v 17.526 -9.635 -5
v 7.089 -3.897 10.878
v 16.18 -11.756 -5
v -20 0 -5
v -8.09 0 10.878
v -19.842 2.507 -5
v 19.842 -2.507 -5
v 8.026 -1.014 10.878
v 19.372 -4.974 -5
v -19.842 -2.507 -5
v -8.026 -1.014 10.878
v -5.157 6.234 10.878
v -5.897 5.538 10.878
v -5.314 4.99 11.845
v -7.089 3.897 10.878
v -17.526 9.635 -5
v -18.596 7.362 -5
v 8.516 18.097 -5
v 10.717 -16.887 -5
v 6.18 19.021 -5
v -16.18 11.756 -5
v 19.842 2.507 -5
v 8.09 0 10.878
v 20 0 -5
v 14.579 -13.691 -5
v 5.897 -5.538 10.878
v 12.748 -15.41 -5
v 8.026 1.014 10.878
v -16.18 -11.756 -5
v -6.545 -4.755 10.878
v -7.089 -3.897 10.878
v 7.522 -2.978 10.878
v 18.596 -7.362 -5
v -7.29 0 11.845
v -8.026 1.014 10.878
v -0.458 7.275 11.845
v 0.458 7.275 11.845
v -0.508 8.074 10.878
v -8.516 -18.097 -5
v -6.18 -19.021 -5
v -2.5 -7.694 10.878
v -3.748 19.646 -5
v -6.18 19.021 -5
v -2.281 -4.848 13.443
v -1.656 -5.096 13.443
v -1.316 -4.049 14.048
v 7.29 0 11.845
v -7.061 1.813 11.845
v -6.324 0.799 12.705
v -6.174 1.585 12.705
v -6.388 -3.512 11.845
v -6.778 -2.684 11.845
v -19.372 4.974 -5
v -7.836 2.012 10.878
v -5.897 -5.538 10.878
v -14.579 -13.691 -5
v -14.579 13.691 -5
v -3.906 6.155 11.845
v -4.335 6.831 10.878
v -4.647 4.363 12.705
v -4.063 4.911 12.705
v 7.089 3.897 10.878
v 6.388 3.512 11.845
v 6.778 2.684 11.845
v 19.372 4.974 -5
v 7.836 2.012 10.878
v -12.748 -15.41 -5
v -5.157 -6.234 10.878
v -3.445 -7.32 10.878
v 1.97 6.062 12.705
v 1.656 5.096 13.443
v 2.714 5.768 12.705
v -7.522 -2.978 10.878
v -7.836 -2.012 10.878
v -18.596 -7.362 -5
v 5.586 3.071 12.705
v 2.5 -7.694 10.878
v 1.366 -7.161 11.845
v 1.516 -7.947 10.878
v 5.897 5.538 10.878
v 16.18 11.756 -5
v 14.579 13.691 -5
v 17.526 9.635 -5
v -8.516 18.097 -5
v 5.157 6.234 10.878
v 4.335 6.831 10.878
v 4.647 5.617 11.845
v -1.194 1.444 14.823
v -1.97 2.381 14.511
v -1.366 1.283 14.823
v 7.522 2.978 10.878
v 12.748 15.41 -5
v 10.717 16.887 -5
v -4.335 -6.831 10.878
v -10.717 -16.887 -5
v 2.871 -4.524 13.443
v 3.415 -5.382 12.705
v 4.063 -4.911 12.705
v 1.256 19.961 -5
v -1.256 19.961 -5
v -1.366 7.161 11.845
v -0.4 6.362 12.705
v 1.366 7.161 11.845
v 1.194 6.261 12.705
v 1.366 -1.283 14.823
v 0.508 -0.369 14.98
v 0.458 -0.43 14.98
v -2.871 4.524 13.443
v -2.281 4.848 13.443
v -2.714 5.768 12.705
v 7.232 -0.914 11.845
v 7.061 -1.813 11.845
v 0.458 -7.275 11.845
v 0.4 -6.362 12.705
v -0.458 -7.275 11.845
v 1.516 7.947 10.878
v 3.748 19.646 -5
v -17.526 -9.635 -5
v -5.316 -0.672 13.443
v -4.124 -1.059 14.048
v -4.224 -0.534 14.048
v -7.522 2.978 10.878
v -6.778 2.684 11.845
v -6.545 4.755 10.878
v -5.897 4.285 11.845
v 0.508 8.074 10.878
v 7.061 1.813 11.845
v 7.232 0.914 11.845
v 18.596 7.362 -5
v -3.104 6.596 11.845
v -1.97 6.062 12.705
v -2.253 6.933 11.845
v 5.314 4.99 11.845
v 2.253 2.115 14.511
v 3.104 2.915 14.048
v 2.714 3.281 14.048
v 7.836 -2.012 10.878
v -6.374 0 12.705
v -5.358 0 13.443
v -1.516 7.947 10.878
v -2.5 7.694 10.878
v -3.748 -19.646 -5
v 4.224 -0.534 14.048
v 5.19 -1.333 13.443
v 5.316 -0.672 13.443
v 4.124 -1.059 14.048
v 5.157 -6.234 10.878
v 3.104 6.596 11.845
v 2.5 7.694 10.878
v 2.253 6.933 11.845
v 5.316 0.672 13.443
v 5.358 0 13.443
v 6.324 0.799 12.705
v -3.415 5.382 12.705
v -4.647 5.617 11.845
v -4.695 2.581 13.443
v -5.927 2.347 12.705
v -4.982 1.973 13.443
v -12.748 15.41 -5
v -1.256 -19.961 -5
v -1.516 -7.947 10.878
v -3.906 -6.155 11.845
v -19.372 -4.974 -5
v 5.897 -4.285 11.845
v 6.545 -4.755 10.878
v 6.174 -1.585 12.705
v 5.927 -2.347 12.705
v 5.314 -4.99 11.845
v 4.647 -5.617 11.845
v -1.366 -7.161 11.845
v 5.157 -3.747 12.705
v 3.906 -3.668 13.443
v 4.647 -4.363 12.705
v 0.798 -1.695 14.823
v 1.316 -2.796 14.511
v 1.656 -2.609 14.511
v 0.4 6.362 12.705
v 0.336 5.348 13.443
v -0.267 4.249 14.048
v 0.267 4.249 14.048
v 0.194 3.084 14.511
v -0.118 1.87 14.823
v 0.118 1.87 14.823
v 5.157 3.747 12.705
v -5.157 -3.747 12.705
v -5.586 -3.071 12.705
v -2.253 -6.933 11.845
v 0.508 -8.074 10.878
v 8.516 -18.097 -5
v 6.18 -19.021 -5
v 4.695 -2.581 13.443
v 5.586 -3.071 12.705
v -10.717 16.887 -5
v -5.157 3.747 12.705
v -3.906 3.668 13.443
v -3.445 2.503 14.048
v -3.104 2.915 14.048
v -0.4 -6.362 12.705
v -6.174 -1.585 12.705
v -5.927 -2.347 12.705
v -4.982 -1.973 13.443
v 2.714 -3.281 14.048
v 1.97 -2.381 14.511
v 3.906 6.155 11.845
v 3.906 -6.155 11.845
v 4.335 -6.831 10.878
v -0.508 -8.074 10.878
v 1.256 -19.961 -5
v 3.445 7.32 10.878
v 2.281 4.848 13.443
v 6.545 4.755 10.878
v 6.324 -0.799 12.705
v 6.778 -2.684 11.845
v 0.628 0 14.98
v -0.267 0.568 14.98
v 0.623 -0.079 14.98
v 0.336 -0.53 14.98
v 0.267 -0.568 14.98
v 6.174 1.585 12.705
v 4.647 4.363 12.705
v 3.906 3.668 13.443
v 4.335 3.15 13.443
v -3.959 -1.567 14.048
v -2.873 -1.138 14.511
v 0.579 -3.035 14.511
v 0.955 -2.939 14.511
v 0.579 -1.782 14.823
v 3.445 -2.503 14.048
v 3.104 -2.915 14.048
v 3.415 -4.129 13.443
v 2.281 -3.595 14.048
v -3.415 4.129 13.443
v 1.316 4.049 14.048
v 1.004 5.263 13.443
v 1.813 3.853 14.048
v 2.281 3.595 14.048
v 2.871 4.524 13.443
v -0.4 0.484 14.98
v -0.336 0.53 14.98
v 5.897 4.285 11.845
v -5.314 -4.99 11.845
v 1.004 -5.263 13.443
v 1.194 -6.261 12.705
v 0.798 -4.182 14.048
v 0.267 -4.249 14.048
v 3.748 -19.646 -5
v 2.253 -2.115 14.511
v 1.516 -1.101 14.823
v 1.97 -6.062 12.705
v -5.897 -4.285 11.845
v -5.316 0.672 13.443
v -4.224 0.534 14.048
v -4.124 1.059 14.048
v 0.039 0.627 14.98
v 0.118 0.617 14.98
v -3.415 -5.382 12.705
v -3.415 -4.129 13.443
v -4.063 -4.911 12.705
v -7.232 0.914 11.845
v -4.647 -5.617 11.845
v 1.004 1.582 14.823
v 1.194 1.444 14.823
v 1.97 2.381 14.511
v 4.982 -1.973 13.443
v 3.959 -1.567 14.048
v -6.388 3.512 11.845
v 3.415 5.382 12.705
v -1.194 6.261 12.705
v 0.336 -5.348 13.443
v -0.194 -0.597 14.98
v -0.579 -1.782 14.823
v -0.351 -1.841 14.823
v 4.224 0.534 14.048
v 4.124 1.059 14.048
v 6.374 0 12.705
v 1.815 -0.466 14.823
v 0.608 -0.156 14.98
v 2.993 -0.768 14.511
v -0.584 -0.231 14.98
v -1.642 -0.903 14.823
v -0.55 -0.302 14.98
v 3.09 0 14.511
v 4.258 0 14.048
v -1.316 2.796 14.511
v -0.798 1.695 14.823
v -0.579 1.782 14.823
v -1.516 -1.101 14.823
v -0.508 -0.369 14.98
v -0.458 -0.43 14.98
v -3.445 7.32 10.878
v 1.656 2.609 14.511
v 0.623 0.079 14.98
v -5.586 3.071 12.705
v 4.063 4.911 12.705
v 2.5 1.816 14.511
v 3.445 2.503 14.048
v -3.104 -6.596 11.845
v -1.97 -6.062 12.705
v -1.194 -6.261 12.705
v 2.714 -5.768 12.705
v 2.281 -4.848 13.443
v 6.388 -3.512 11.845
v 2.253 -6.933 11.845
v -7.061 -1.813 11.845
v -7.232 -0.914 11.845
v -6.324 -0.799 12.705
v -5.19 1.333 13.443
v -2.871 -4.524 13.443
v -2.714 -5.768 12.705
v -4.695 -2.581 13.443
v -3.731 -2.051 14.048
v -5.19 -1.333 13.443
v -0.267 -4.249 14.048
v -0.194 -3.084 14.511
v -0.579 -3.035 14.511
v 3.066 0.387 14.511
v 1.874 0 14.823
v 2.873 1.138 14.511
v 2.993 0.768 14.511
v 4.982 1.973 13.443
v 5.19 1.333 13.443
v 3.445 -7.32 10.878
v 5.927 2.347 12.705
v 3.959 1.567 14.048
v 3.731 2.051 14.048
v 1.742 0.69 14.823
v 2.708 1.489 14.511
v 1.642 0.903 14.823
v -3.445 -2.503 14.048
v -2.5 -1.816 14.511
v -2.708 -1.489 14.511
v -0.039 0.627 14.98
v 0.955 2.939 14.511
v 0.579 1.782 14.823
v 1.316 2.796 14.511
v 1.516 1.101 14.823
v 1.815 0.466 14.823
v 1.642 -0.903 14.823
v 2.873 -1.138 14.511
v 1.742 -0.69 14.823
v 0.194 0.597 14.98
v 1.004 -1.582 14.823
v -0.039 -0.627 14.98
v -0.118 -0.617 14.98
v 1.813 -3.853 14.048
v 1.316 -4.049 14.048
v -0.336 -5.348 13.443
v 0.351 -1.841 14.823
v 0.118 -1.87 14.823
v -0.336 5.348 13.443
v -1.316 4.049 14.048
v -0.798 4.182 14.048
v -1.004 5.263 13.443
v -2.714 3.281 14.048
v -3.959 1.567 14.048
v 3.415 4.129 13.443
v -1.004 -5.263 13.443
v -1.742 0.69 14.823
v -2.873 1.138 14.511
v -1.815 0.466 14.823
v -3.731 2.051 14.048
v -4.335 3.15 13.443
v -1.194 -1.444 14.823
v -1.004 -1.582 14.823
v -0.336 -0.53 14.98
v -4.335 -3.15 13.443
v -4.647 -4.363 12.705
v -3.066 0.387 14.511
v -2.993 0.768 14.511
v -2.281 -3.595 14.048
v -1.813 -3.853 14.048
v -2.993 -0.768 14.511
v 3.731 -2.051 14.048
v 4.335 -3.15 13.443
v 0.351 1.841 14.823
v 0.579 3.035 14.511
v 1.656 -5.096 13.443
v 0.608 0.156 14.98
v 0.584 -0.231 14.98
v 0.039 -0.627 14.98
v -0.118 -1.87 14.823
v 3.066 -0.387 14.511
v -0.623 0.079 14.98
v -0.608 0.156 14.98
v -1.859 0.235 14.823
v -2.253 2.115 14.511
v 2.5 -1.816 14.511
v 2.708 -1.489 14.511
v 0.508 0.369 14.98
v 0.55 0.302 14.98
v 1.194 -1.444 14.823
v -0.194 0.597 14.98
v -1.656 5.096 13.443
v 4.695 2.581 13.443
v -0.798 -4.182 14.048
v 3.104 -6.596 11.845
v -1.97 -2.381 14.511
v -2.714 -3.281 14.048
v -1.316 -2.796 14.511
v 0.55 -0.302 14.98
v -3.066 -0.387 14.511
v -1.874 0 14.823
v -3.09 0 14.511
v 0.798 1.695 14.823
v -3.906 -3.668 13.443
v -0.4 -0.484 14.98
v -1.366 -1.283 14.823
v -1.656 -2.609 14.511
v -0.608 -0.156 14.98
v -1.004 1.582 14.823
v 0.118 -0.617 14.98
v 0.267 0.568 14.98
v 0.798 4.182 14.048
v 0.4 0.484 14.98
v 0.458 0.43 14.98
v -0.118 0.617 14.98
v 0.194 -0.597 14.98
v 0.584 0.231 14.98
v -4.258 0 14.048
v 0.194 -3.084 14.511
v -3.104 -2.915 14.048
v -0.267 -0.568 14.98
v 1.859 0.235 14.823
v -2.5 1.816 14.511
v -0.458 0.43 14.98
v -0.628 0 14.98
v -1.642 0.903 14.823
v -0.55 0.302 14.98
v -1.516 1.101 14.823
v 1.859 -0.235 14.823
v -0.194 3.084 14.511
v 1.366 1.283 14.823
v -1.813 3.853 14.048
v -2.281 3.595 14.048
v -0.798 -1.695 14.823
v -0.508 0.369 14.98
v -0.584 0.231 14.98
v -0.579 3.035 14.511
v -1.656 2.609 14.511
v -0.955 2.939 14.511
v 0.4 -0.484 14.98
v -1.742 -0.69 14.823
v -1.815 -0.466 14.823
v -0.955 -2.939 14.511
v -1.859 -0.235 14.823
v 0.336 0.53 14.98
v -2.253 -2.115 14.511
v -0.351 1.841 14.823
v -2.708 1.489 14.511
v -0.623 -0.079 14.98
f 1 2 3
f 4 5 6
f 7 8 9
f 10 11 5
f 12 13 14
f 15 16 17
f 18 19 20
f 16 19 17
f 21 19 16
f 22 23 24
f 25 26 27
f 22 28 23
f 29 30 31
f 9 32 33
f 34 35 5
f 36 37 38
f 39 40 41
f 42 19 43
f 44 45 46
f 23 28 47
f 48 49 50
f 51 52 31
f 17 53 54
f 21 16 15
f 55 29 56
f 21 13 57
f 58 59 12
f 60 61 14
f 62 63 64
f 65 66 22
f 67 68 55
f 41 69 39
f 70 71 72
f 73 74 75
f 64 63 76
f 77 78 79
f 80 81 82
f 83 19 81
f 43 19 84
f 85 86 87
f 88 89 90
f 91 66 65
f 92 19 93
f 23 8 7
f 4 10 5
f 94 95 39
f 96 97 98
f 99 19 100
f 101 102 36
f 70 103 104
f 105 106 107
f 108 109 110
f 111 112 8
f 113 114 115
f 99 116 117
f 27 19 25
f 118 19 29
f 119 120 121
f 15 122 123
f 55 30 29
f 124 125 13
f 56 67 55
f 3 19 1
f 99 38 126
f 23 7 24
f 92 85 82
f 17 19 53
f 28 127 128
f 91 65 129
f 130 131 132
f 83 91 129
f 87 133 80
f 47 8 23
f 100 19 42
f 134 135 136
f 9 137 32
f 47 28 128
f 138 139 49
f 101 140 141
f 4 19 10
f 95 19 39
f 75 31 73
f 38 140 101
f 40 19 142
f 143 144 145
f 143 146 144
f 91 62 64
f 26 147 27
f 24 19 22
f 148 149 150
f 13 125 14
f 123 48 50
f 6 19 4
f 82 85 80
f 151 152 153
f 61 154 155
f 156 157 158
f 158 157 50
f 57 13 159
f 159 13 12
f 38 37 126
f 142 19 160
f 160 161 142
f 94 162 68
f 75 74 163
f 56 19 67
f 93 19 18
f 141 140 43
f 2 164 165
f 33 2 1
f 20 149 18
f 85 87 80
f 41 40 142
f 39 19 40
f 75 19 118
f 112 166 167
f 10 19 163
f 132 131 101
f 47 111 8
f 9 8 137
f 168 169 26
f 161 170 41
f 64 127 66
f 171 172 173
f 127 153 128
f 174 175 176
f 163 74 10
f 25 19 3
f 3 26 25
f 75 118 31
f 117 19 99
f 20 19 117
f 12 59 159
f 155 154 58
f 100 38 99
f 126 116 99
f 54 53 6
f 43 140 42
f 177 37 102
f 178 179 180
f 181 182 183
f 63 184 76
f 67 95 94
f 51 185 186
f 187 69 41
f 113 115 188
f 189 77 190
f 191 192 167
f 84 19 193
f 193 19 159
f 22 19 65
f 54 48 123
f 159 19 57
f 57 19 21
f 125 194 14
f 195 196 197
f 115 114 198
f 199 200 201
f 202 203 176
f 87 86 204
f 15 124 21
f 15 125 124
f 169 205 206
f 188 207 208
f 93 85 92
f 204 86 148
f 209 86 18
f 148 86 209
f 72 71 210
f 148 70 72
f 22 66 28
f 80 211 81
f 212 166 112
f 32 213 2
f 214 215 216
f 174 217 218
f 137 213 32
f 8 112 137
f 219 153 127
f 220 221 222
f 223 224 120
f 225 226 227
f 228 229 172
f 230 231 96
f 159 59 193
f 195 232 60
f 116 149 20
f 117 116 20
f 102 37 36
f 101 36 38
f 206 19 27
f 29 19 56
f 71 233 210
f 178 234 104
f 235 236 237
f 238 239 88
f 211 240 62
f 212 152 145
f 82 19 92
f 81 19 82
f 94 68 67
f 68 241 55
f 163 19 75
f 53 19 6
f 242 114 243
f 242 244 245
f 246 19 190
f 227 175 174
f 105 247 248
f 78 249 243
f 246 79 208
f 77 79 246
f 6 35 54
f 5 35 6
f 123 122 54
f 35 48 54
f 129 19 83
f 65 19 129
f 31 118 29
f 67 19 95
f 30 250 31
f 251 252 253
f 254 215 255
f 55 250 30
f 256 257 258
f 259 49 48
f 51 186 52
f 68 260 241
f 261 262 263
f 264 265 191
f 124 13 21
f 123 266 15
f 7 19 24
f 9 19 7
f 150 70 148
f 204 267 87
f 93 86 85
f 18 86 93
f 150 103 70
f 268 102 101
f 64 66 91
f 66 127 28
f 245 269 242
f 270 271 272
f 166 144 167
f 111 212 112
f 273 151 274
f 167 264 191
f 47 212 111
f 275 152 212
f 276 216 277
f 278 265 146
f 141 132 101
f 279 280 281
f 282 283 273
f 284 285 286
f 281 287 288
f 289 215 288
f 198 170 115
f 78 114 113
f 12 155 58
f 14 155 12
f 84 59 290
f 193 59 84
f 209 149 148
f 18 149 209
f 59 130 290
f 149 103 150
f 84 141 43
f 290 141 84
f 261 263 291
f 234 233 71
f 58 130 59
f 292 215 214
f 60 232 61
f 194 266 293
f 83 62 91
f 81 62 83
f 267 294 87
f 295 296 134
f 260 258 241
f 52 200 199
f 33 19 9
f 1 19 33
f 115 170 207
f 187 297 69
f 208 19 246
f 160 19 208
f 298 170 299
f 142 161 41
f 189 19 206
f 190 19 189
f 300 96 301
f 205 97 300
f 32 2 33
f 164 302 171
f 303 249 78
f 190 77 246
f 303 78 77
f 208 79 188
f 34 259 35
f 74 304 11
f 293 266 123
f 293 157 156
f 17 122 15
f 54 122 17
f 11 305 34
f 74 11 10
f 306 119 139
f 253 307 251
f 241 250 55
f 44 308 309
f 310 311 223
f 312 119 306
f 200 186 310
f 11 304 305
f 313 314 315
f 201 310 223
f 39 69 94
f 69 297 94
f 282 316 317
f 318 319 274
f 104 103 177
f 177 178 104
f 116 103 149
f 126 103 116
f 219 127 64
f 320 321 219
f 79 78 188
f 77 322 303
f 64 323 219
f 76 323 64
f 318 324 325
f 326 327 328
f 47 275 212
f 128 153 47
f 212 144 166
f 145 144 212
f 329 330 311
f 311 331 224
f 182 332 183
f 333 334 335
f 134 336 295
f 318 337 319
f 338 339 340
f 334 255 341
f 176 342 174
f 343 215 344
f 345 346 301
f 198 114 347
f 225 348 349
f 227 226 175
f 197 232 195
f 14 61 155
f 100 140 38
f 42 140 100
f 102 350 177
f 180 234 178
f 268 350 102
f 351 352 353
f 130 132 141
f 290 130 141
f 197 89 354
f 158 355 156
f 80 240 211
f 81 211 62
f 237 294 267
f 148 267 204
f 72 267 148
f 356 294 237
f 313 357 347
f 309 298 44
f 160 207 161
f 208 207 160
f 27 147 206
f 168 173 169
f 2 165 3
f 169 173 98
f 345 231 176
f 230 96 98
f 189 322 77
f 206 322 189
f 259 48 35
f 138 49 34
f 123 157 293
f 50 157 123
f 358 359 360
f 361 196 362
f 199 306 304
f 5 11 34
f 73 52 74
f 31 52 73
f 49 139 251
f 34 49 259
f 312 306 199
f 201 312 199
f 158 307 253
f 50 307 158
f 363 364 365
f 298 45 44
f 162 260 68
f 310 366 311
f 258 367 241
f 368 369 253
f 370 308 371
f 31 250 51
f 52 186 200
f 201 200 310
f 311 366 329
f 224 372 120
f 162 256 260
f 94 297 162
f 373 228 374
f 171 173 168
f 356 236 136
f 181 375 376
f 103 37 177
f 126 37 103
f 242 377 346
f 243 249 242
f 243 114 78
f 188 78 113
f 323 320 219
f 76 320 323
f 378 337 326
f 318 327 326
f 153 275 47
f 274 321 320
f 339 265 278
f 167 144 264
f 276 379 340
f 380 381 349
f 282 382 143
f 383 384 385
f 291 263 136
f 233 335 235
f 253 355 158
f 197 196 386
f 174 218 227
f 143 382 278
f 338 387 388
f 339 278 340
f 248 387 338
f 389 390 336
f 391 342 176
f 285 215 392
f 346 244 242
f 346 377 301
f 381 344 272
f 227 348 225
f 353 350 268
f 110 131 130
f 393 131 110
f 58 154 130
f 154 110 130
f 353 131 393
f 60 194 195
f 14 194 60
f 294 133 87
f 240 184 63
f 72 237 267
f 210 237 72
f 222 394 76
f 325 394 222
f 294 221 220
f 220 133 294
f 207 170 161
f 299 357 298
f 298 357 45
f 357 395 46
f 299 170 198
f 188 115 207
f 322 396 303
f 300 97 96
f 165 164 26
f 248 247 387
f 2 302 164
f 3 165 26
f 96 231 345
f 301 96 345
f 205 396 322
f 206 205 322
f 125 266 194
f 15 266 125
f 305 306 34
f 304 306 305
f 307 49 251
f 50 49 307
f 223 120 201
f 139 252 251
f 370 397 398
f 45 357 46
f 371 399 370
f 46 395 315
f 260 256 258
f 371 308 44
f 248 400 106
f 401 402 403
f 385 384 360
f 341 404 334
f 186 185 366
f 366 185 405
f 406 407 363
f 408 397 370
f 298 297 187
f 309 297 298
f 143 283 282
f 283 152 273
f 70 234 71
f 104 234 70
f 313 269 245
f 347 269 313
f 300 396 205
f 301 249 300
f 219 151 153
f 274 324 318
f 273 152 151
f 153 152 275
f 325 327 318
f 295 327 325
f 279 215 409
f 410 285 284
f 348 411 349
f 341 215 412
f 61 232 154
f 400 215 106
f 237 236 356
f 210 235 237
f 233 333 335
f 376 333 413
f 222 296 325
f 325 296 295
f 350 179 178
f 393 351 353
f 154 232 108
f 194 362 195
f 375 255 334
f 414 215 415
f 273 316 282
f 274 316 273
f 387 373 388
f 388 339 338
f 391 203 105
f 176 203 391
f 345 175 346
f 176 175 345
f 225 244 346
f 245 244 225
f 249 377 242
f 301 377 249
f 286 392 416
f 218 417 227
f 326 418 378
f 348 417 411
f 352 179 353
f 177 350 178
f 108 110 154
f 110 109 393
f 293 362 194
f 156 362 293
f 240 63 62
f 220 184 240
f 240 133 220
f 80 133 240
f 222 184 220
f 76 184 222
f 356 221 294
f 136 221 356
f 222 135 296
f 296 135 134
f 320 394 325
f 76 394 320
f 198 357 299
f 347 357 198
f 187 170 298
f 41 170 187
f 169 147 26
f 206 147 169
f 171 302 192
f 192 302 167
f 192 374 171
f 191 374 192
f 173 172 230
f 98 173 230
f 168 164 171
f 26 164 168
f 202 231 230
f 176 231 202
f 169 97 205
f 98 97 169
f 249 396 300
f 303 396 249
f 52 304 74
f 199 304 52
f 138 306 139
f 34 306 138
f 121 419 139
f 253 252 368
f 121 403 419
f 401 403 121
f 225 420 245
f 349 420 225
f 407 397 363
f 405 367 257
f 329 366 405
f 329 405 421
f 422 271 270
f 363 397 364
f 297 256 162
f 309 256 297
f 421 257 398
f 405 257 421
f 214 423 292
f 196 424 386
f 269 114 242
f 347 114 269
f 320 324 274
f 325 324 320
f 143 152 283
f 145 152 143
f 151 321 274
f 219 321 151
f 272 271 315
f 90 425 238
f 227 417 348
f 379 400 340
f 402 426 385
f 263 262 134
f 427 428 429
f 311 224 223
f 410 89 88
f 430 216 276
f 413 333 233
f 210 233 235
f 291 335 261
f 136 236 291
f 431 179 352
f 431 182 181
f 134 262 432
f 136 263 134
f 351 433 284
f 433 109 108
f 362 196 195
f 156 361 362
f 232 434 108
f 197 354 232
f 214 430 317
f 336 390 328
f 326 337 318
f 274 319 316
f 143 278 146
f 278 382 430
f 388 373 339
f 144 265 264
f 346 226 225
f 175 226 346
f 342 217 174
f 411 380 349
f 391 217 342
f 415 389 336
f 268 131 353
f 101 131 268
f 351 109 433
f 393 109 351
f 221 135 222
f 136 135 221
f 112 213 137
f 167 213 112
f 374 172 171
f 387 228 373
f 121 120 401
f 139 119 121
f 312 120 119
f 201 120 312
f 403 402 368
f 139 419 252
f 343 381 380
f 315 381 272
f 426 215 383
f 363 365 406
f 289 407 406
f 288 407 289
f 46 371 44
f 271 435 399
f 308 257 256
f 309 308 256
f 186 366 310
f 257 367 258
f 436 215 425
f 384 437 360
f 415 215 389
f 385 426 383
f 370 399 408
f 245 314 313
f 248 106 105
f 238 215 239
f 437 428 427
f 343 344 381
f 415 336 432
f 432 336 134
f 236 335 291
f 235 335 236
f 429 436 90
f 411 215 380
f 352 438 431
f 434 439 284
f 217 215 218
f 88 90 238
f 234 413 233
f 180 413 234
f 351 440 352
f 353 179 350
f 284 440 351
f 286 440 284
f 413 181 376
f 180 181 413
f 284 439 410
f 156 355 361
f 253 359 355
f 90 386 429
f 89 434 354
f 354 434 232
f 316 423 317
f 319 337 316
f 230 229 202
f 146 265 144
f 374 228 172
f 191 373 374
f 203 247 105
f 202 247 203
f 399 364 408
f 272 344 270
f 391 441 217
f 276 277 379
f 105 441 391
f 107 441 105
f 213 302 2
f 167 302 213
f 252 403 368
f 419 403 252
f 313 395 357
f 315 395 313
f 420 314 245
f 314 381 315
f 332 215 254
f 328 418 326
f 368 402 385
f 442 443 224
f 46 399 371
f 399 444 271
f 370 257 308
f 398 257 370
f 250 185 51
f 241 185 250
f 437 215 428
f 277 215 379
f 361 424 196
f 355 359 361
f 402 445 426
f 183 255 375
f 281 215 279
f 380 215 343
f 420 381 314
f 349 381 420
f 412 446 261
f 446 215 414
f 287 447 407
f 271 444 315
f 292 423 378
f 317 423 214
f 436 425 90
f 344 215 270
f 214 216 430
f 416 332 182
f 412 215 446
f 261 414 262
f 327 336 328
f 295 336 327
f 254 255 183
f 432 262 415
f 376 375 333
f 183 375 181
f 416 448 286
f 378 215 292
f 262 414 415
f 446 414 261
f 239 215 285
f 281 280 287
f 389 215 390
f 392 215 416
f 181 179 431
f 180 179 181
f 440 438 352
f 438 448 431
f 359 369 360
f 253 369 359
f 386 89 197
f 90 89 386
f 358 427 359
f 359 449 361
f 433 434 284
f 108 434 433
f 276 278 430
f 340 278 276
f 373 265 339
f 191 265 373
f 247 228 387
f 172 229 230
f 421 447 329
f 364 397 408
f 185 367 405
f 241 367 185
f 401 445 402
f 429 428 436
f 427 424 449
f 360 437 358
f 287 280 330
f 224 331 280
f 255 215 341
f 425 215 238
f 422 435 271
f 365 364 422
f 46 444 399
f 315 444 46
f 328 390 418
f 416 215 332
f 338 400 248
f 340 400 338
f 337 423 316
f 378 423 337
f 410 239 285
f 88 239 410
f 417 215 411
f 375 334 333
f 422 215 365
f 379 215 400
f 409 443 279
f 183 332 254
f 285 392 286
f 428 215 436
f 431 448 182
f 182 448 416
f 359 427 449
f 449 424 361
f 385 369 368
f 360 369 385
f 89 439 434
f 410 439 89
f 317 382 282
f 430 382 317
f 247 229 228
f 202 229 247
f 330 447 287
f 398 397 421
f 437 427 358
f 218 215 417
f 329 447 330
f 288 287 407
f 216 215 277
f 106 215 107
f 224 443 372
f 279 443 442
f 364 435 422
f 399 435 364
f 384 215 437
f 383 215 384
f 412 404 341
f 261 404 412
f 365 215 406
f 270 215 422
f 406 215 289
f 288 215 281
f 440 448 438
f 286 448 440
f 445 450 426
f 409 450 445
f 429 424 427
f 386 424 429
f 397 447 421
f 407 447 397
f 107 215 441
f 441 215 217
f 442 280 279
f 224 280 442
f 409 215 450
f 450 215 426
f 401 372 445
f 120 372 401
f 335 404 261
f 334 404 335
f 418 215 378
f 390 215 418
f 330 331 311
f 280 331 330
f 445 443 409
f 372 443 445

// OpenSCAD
if (false){
rotate_extrude($fn=100) 
translate([1,0,0])
offset(r=0.2)
polygon( points=[[0,0],[2,1],[3,4],[0,5]] );
}

if (true){
translate([0,0,0])
 hull(){
    cylinder(10,20,10,$fn=50,center=true);
    translate([0,0,5]) sphere(r=10,$fn=50);
     }
}


if (false){ 
rotate_extrude($fn=100) 
translate([20,0,0])     
offset(r=5, $fn=20) polygon(points=[[0,0],[10,0],[13,1],[14,2],[13,4],[10,5]]);
}
